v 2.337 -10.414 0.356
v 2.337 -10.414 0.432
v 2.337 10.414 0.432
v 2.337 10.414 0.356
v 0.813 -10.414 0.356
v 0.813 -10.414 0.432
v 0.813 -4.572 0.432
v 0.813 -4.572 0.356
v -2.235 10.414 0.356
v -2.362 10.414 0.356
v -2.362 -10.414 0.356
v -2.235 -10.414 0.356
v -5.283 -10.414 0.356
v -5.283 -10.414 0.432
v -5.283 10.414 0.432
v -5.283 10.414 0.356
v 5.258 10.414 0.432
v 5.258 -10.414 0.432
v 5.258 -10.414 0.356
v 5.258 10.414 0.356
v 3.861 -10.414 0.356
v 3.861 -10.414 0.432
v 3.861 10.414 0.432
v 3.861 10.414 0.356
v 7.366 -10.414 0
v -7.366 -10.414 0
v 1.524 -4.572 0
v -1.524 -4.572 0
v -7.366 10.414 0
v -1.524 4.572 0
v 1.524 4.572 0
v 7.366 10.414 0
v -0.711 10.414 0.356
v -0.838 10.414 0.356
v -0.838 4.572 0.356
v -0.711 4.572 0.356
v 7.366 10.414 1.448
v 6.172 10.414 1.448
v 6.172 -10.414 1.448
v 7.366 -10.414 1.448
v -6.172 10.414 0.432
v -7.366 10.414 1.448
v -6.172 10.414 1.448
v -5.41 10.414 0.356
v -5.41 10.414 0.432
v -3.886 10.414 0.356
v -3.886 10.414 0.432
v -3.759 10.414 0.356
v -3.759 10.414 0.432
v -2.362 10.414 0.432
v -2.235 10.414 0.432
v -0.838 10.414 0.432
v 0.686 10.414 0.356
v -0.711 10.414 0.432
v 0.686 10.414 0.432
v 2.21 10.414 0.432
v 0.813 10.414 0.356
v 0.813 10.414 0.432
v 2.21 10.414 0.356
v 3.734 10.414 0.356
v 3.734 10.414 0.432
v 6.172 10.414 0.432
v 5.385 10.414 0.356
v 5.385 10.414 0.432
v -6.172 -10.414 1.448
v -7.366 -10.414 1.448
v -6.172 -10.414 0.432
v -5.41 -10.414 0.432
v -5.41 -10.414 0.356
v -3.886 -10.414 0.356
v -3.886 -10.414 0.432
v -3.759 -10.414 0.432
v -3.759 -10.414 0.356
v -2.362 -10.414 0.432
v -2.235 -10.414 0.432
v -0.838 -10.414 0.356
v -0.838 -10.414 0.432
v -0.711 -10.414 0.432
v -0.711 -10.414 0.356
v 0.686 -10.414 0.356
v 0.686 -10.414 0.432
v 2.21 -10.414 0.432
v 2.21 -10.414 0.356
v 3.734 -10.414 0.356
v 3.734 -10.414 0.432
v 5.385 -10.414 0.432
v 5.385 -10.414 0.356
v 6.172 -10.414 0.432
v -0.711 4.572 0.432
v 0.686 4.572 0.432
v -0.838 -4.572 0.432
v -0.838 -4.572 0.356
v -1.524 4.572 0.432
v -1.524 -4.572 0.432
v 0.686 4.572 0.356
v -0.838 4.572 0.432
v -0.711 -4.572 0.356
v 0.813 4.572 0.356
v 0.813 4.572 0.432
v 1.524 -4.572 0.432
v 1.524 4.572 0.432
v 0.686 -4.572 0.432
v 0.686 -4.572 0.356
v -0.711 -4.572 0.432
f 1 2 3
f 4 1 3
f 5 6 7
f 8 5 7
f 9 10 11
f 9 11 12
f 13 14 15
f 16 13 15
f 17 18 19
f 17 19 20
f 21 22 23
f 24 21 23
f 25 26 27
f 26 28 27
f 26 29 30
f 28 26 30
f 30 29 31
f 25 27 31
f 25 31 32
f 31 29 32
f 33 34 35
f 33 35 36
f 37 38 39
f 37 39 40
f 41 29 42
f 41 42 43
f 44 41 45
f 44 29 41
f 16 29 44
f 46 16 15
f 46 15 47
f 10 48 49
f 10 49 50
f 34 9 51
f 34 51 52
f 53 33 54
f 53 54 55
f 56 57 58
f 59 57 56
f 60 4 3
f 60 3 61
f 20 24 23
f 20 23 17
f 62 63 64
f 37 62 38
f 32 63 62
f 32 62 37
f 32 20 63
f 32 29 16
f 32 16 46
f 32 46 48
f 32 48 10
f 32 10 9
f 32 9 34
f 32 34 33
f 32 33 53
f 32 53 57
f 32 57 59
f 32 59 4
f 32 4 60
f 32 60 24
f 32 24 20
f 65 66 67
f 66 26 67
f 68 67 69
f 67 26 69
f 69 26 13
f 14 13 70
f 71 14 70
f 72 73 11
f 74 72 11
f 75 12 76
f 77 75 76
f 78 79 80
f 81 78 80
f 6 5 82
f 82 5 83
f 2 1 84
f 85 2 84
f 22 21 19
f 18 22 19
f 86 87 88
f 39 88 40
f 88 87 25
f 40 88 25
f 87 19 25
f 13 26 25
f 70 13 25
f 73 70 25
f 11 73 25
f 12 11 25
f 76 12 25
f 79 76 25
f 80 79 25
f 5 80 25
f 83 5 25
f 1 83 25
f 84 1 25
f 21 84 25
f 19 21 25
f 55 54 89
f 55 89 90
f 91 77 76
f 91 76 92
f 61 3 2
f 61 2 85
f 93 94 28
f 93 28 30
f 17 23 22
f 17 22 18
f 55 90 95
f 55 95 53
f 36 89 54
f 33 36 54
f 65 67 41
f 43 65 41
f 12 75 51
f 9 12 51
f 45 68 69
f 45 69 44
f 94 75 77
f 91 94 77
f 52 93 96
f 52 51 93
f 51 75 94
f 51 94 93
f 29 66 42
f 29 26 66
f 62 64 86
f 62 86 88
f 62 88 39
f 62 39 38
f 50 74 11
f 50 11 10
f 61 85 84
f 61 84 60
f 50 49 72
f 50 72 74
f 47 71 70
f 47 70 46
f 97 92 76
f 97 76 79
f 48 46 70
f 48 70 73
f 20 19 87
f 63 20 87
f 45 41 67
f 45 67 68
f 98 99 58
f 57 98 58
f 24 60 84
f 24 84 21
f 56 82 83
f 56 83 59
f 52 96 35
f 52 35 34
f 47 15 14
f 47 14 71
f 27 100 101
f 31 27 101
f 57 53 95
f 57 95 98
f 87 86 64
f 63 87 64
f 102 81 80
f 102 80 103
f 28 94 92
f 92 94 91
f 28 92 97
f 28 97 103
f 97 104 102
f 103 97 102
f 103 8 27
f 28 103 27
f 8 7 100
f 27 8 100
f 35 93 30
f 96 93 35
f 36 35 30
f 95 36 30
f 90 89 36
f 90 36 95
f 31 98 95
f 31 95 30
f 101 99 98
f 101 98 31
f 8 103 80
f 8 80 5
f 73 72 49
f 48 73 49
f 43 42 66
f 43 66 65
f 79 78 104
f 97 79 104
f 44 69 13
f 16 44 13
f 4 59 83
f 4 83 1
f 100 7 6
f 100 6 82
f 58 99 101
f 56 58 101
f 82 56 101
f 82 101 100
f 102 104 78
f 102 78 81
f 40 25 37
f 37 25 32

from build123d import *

# Parameters (mm, degrees)
F0_W     = 14.732
F0_H     = 20.828
F1_DEPTH = 0.4318
F2_W     = 0.127
F2_H     = 20.828
F3_DEPTH = 0.0762
F4_W     = 3.048
F4_H     = 9.144
F5_DEPTH = 25.4
F6_W     = 1.1938
F6_H     = 20.828
F7_DEPTH = 1.016


with BuildPart() as f1:
    # F0 (on Top) → F1 (new body)
    with BuildSketch(Plane.XY):
        Rectangle(F0_W, F0_H)
    extrude(amount=F1_DEPTH)

    # F2 (on face) → F3 (cut)
    with BuildSketch(Plane.XY.offset(0.4318)):
        with Locations((-5.3467, 0)):
            Rectangle(F2_W, F2_H)
        with Locations((-3.8227, 0)):
            Rectangle(F2_W, F2_H)
        with Locations((-2.2987, 0)):
            Rectangle(F2_W, F2_H)
        with Locations((-0.7747, 0)):
            Rectangle(F2_W, F2_H)
        with Locations((0.7493, 0)):
            Rectangle(F2_W, F2_H)
        with Locations((2.2733, 0)):
            Rectangle(F2_W, F2_H)
        with Locations((3.7973, 0)):
            Rectangle(F2_W, F2_H)
        with Locations((5.3213, 0)):
            Rectangle(F2_W, F2_H)
    extrude(amount=-F3_DEPTH, mode=Mode.SUBTRACT)

    # F4 (on face) → F5 (cut)
    with BuildSketch(Plane.XY.offset(0.4318)):
        Rectangle(F4_W, F4_H)
    extrude(amount=-F5_DEPTH, mode=Mode.SUBTRACT)

    # F6 (on face) → F7 (join)
    with BuildSketch(Plane.XY.offset(0.4318)):
        with Locations((-6.7691, 0)):
            Rectangle(F6_W, F6_H)
        with Locations((6.7691, 0)):
            Rectangle(F6_W, F6_H)
    extrude(amount=F7_DEPTH)


solid = f1.part
